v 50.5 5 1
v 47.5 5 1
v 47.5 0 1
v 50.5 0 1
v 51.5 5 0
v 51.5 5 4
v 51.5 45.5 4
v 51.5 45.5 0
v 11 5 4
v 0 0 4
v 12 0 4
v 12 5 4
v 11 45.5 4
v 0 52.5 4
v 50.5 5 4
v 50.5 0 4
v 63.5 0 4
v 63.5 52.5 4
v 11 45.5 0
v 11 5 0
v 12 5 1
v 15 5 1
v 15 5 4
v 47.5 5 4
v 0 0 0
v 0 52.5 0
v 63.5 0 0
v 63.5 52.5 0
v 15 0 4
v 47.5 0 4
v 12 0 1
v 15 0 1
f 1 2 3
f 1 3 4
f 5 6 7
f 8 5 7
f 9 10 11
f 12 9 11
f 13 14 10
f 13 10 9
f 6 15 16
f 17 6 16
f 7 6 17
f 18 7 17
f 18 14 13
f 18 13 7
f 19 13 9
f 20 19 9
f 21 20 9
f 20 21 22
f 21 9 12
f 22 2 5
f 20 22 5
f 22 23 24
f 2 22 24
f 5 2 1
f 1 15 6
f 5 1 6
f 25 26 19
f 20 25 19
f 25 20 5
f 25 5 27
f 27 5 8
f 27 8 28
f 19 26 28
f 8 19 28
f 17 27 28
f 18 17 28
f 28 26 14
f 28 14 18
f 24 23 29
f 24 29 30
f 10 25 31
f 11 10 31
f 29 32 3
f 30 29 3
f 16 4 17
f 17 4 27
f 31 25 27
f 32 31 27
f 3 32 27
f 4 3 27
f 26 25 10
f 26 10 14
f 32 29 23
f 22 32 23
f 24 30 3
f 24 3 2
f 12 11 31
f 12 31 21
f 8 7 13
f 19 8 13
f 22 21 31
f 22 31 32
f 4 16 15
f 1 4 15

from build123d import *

# Parameters (mm, degrees)
F0_W     = 63.5
F0_H     = 52.5
F1_DEPTH = 4
F2_W     = 3
F2_H     = 5
F3_DEPTH = 3
F4_DEPTH = 4


with BuildPart() as f1:
    # F0 (on Top) → F1 (new body)
    with BuildSketch(Plane.XY):
        with Locations((31.75, 26.25)):
            Rectangle(F0_W, F0_H)
    extrude(amount=F1_DEPTH)

    # F2 (on face) → F3 (cut)
    with BuildSketch(Plane.XY.offset(4)):
        with Locations((13.5, 2.5)):
            Rectangle(F2_W, F2_H)
        with Locations((49, 2.5)):
            Rectangle(F2_W, F2_H)
    extrude(amount=-F3_DEPTH, mode=Mode.SUBTRACT)

    # F2 (on face) → F4 (cut)
    with BuildSketch(Plane.XY.offset(4)):
        Polygon((11, 45.5), (11, 5), (12, 5), (15, 5), (47.5, 5), (50.5, 5), (51.5, 5), (51.5, 45.5), align=None)
    extrude(amount=-F4_DEPTH, mode=Mode.SUBTRACT)


solid = f1.part
